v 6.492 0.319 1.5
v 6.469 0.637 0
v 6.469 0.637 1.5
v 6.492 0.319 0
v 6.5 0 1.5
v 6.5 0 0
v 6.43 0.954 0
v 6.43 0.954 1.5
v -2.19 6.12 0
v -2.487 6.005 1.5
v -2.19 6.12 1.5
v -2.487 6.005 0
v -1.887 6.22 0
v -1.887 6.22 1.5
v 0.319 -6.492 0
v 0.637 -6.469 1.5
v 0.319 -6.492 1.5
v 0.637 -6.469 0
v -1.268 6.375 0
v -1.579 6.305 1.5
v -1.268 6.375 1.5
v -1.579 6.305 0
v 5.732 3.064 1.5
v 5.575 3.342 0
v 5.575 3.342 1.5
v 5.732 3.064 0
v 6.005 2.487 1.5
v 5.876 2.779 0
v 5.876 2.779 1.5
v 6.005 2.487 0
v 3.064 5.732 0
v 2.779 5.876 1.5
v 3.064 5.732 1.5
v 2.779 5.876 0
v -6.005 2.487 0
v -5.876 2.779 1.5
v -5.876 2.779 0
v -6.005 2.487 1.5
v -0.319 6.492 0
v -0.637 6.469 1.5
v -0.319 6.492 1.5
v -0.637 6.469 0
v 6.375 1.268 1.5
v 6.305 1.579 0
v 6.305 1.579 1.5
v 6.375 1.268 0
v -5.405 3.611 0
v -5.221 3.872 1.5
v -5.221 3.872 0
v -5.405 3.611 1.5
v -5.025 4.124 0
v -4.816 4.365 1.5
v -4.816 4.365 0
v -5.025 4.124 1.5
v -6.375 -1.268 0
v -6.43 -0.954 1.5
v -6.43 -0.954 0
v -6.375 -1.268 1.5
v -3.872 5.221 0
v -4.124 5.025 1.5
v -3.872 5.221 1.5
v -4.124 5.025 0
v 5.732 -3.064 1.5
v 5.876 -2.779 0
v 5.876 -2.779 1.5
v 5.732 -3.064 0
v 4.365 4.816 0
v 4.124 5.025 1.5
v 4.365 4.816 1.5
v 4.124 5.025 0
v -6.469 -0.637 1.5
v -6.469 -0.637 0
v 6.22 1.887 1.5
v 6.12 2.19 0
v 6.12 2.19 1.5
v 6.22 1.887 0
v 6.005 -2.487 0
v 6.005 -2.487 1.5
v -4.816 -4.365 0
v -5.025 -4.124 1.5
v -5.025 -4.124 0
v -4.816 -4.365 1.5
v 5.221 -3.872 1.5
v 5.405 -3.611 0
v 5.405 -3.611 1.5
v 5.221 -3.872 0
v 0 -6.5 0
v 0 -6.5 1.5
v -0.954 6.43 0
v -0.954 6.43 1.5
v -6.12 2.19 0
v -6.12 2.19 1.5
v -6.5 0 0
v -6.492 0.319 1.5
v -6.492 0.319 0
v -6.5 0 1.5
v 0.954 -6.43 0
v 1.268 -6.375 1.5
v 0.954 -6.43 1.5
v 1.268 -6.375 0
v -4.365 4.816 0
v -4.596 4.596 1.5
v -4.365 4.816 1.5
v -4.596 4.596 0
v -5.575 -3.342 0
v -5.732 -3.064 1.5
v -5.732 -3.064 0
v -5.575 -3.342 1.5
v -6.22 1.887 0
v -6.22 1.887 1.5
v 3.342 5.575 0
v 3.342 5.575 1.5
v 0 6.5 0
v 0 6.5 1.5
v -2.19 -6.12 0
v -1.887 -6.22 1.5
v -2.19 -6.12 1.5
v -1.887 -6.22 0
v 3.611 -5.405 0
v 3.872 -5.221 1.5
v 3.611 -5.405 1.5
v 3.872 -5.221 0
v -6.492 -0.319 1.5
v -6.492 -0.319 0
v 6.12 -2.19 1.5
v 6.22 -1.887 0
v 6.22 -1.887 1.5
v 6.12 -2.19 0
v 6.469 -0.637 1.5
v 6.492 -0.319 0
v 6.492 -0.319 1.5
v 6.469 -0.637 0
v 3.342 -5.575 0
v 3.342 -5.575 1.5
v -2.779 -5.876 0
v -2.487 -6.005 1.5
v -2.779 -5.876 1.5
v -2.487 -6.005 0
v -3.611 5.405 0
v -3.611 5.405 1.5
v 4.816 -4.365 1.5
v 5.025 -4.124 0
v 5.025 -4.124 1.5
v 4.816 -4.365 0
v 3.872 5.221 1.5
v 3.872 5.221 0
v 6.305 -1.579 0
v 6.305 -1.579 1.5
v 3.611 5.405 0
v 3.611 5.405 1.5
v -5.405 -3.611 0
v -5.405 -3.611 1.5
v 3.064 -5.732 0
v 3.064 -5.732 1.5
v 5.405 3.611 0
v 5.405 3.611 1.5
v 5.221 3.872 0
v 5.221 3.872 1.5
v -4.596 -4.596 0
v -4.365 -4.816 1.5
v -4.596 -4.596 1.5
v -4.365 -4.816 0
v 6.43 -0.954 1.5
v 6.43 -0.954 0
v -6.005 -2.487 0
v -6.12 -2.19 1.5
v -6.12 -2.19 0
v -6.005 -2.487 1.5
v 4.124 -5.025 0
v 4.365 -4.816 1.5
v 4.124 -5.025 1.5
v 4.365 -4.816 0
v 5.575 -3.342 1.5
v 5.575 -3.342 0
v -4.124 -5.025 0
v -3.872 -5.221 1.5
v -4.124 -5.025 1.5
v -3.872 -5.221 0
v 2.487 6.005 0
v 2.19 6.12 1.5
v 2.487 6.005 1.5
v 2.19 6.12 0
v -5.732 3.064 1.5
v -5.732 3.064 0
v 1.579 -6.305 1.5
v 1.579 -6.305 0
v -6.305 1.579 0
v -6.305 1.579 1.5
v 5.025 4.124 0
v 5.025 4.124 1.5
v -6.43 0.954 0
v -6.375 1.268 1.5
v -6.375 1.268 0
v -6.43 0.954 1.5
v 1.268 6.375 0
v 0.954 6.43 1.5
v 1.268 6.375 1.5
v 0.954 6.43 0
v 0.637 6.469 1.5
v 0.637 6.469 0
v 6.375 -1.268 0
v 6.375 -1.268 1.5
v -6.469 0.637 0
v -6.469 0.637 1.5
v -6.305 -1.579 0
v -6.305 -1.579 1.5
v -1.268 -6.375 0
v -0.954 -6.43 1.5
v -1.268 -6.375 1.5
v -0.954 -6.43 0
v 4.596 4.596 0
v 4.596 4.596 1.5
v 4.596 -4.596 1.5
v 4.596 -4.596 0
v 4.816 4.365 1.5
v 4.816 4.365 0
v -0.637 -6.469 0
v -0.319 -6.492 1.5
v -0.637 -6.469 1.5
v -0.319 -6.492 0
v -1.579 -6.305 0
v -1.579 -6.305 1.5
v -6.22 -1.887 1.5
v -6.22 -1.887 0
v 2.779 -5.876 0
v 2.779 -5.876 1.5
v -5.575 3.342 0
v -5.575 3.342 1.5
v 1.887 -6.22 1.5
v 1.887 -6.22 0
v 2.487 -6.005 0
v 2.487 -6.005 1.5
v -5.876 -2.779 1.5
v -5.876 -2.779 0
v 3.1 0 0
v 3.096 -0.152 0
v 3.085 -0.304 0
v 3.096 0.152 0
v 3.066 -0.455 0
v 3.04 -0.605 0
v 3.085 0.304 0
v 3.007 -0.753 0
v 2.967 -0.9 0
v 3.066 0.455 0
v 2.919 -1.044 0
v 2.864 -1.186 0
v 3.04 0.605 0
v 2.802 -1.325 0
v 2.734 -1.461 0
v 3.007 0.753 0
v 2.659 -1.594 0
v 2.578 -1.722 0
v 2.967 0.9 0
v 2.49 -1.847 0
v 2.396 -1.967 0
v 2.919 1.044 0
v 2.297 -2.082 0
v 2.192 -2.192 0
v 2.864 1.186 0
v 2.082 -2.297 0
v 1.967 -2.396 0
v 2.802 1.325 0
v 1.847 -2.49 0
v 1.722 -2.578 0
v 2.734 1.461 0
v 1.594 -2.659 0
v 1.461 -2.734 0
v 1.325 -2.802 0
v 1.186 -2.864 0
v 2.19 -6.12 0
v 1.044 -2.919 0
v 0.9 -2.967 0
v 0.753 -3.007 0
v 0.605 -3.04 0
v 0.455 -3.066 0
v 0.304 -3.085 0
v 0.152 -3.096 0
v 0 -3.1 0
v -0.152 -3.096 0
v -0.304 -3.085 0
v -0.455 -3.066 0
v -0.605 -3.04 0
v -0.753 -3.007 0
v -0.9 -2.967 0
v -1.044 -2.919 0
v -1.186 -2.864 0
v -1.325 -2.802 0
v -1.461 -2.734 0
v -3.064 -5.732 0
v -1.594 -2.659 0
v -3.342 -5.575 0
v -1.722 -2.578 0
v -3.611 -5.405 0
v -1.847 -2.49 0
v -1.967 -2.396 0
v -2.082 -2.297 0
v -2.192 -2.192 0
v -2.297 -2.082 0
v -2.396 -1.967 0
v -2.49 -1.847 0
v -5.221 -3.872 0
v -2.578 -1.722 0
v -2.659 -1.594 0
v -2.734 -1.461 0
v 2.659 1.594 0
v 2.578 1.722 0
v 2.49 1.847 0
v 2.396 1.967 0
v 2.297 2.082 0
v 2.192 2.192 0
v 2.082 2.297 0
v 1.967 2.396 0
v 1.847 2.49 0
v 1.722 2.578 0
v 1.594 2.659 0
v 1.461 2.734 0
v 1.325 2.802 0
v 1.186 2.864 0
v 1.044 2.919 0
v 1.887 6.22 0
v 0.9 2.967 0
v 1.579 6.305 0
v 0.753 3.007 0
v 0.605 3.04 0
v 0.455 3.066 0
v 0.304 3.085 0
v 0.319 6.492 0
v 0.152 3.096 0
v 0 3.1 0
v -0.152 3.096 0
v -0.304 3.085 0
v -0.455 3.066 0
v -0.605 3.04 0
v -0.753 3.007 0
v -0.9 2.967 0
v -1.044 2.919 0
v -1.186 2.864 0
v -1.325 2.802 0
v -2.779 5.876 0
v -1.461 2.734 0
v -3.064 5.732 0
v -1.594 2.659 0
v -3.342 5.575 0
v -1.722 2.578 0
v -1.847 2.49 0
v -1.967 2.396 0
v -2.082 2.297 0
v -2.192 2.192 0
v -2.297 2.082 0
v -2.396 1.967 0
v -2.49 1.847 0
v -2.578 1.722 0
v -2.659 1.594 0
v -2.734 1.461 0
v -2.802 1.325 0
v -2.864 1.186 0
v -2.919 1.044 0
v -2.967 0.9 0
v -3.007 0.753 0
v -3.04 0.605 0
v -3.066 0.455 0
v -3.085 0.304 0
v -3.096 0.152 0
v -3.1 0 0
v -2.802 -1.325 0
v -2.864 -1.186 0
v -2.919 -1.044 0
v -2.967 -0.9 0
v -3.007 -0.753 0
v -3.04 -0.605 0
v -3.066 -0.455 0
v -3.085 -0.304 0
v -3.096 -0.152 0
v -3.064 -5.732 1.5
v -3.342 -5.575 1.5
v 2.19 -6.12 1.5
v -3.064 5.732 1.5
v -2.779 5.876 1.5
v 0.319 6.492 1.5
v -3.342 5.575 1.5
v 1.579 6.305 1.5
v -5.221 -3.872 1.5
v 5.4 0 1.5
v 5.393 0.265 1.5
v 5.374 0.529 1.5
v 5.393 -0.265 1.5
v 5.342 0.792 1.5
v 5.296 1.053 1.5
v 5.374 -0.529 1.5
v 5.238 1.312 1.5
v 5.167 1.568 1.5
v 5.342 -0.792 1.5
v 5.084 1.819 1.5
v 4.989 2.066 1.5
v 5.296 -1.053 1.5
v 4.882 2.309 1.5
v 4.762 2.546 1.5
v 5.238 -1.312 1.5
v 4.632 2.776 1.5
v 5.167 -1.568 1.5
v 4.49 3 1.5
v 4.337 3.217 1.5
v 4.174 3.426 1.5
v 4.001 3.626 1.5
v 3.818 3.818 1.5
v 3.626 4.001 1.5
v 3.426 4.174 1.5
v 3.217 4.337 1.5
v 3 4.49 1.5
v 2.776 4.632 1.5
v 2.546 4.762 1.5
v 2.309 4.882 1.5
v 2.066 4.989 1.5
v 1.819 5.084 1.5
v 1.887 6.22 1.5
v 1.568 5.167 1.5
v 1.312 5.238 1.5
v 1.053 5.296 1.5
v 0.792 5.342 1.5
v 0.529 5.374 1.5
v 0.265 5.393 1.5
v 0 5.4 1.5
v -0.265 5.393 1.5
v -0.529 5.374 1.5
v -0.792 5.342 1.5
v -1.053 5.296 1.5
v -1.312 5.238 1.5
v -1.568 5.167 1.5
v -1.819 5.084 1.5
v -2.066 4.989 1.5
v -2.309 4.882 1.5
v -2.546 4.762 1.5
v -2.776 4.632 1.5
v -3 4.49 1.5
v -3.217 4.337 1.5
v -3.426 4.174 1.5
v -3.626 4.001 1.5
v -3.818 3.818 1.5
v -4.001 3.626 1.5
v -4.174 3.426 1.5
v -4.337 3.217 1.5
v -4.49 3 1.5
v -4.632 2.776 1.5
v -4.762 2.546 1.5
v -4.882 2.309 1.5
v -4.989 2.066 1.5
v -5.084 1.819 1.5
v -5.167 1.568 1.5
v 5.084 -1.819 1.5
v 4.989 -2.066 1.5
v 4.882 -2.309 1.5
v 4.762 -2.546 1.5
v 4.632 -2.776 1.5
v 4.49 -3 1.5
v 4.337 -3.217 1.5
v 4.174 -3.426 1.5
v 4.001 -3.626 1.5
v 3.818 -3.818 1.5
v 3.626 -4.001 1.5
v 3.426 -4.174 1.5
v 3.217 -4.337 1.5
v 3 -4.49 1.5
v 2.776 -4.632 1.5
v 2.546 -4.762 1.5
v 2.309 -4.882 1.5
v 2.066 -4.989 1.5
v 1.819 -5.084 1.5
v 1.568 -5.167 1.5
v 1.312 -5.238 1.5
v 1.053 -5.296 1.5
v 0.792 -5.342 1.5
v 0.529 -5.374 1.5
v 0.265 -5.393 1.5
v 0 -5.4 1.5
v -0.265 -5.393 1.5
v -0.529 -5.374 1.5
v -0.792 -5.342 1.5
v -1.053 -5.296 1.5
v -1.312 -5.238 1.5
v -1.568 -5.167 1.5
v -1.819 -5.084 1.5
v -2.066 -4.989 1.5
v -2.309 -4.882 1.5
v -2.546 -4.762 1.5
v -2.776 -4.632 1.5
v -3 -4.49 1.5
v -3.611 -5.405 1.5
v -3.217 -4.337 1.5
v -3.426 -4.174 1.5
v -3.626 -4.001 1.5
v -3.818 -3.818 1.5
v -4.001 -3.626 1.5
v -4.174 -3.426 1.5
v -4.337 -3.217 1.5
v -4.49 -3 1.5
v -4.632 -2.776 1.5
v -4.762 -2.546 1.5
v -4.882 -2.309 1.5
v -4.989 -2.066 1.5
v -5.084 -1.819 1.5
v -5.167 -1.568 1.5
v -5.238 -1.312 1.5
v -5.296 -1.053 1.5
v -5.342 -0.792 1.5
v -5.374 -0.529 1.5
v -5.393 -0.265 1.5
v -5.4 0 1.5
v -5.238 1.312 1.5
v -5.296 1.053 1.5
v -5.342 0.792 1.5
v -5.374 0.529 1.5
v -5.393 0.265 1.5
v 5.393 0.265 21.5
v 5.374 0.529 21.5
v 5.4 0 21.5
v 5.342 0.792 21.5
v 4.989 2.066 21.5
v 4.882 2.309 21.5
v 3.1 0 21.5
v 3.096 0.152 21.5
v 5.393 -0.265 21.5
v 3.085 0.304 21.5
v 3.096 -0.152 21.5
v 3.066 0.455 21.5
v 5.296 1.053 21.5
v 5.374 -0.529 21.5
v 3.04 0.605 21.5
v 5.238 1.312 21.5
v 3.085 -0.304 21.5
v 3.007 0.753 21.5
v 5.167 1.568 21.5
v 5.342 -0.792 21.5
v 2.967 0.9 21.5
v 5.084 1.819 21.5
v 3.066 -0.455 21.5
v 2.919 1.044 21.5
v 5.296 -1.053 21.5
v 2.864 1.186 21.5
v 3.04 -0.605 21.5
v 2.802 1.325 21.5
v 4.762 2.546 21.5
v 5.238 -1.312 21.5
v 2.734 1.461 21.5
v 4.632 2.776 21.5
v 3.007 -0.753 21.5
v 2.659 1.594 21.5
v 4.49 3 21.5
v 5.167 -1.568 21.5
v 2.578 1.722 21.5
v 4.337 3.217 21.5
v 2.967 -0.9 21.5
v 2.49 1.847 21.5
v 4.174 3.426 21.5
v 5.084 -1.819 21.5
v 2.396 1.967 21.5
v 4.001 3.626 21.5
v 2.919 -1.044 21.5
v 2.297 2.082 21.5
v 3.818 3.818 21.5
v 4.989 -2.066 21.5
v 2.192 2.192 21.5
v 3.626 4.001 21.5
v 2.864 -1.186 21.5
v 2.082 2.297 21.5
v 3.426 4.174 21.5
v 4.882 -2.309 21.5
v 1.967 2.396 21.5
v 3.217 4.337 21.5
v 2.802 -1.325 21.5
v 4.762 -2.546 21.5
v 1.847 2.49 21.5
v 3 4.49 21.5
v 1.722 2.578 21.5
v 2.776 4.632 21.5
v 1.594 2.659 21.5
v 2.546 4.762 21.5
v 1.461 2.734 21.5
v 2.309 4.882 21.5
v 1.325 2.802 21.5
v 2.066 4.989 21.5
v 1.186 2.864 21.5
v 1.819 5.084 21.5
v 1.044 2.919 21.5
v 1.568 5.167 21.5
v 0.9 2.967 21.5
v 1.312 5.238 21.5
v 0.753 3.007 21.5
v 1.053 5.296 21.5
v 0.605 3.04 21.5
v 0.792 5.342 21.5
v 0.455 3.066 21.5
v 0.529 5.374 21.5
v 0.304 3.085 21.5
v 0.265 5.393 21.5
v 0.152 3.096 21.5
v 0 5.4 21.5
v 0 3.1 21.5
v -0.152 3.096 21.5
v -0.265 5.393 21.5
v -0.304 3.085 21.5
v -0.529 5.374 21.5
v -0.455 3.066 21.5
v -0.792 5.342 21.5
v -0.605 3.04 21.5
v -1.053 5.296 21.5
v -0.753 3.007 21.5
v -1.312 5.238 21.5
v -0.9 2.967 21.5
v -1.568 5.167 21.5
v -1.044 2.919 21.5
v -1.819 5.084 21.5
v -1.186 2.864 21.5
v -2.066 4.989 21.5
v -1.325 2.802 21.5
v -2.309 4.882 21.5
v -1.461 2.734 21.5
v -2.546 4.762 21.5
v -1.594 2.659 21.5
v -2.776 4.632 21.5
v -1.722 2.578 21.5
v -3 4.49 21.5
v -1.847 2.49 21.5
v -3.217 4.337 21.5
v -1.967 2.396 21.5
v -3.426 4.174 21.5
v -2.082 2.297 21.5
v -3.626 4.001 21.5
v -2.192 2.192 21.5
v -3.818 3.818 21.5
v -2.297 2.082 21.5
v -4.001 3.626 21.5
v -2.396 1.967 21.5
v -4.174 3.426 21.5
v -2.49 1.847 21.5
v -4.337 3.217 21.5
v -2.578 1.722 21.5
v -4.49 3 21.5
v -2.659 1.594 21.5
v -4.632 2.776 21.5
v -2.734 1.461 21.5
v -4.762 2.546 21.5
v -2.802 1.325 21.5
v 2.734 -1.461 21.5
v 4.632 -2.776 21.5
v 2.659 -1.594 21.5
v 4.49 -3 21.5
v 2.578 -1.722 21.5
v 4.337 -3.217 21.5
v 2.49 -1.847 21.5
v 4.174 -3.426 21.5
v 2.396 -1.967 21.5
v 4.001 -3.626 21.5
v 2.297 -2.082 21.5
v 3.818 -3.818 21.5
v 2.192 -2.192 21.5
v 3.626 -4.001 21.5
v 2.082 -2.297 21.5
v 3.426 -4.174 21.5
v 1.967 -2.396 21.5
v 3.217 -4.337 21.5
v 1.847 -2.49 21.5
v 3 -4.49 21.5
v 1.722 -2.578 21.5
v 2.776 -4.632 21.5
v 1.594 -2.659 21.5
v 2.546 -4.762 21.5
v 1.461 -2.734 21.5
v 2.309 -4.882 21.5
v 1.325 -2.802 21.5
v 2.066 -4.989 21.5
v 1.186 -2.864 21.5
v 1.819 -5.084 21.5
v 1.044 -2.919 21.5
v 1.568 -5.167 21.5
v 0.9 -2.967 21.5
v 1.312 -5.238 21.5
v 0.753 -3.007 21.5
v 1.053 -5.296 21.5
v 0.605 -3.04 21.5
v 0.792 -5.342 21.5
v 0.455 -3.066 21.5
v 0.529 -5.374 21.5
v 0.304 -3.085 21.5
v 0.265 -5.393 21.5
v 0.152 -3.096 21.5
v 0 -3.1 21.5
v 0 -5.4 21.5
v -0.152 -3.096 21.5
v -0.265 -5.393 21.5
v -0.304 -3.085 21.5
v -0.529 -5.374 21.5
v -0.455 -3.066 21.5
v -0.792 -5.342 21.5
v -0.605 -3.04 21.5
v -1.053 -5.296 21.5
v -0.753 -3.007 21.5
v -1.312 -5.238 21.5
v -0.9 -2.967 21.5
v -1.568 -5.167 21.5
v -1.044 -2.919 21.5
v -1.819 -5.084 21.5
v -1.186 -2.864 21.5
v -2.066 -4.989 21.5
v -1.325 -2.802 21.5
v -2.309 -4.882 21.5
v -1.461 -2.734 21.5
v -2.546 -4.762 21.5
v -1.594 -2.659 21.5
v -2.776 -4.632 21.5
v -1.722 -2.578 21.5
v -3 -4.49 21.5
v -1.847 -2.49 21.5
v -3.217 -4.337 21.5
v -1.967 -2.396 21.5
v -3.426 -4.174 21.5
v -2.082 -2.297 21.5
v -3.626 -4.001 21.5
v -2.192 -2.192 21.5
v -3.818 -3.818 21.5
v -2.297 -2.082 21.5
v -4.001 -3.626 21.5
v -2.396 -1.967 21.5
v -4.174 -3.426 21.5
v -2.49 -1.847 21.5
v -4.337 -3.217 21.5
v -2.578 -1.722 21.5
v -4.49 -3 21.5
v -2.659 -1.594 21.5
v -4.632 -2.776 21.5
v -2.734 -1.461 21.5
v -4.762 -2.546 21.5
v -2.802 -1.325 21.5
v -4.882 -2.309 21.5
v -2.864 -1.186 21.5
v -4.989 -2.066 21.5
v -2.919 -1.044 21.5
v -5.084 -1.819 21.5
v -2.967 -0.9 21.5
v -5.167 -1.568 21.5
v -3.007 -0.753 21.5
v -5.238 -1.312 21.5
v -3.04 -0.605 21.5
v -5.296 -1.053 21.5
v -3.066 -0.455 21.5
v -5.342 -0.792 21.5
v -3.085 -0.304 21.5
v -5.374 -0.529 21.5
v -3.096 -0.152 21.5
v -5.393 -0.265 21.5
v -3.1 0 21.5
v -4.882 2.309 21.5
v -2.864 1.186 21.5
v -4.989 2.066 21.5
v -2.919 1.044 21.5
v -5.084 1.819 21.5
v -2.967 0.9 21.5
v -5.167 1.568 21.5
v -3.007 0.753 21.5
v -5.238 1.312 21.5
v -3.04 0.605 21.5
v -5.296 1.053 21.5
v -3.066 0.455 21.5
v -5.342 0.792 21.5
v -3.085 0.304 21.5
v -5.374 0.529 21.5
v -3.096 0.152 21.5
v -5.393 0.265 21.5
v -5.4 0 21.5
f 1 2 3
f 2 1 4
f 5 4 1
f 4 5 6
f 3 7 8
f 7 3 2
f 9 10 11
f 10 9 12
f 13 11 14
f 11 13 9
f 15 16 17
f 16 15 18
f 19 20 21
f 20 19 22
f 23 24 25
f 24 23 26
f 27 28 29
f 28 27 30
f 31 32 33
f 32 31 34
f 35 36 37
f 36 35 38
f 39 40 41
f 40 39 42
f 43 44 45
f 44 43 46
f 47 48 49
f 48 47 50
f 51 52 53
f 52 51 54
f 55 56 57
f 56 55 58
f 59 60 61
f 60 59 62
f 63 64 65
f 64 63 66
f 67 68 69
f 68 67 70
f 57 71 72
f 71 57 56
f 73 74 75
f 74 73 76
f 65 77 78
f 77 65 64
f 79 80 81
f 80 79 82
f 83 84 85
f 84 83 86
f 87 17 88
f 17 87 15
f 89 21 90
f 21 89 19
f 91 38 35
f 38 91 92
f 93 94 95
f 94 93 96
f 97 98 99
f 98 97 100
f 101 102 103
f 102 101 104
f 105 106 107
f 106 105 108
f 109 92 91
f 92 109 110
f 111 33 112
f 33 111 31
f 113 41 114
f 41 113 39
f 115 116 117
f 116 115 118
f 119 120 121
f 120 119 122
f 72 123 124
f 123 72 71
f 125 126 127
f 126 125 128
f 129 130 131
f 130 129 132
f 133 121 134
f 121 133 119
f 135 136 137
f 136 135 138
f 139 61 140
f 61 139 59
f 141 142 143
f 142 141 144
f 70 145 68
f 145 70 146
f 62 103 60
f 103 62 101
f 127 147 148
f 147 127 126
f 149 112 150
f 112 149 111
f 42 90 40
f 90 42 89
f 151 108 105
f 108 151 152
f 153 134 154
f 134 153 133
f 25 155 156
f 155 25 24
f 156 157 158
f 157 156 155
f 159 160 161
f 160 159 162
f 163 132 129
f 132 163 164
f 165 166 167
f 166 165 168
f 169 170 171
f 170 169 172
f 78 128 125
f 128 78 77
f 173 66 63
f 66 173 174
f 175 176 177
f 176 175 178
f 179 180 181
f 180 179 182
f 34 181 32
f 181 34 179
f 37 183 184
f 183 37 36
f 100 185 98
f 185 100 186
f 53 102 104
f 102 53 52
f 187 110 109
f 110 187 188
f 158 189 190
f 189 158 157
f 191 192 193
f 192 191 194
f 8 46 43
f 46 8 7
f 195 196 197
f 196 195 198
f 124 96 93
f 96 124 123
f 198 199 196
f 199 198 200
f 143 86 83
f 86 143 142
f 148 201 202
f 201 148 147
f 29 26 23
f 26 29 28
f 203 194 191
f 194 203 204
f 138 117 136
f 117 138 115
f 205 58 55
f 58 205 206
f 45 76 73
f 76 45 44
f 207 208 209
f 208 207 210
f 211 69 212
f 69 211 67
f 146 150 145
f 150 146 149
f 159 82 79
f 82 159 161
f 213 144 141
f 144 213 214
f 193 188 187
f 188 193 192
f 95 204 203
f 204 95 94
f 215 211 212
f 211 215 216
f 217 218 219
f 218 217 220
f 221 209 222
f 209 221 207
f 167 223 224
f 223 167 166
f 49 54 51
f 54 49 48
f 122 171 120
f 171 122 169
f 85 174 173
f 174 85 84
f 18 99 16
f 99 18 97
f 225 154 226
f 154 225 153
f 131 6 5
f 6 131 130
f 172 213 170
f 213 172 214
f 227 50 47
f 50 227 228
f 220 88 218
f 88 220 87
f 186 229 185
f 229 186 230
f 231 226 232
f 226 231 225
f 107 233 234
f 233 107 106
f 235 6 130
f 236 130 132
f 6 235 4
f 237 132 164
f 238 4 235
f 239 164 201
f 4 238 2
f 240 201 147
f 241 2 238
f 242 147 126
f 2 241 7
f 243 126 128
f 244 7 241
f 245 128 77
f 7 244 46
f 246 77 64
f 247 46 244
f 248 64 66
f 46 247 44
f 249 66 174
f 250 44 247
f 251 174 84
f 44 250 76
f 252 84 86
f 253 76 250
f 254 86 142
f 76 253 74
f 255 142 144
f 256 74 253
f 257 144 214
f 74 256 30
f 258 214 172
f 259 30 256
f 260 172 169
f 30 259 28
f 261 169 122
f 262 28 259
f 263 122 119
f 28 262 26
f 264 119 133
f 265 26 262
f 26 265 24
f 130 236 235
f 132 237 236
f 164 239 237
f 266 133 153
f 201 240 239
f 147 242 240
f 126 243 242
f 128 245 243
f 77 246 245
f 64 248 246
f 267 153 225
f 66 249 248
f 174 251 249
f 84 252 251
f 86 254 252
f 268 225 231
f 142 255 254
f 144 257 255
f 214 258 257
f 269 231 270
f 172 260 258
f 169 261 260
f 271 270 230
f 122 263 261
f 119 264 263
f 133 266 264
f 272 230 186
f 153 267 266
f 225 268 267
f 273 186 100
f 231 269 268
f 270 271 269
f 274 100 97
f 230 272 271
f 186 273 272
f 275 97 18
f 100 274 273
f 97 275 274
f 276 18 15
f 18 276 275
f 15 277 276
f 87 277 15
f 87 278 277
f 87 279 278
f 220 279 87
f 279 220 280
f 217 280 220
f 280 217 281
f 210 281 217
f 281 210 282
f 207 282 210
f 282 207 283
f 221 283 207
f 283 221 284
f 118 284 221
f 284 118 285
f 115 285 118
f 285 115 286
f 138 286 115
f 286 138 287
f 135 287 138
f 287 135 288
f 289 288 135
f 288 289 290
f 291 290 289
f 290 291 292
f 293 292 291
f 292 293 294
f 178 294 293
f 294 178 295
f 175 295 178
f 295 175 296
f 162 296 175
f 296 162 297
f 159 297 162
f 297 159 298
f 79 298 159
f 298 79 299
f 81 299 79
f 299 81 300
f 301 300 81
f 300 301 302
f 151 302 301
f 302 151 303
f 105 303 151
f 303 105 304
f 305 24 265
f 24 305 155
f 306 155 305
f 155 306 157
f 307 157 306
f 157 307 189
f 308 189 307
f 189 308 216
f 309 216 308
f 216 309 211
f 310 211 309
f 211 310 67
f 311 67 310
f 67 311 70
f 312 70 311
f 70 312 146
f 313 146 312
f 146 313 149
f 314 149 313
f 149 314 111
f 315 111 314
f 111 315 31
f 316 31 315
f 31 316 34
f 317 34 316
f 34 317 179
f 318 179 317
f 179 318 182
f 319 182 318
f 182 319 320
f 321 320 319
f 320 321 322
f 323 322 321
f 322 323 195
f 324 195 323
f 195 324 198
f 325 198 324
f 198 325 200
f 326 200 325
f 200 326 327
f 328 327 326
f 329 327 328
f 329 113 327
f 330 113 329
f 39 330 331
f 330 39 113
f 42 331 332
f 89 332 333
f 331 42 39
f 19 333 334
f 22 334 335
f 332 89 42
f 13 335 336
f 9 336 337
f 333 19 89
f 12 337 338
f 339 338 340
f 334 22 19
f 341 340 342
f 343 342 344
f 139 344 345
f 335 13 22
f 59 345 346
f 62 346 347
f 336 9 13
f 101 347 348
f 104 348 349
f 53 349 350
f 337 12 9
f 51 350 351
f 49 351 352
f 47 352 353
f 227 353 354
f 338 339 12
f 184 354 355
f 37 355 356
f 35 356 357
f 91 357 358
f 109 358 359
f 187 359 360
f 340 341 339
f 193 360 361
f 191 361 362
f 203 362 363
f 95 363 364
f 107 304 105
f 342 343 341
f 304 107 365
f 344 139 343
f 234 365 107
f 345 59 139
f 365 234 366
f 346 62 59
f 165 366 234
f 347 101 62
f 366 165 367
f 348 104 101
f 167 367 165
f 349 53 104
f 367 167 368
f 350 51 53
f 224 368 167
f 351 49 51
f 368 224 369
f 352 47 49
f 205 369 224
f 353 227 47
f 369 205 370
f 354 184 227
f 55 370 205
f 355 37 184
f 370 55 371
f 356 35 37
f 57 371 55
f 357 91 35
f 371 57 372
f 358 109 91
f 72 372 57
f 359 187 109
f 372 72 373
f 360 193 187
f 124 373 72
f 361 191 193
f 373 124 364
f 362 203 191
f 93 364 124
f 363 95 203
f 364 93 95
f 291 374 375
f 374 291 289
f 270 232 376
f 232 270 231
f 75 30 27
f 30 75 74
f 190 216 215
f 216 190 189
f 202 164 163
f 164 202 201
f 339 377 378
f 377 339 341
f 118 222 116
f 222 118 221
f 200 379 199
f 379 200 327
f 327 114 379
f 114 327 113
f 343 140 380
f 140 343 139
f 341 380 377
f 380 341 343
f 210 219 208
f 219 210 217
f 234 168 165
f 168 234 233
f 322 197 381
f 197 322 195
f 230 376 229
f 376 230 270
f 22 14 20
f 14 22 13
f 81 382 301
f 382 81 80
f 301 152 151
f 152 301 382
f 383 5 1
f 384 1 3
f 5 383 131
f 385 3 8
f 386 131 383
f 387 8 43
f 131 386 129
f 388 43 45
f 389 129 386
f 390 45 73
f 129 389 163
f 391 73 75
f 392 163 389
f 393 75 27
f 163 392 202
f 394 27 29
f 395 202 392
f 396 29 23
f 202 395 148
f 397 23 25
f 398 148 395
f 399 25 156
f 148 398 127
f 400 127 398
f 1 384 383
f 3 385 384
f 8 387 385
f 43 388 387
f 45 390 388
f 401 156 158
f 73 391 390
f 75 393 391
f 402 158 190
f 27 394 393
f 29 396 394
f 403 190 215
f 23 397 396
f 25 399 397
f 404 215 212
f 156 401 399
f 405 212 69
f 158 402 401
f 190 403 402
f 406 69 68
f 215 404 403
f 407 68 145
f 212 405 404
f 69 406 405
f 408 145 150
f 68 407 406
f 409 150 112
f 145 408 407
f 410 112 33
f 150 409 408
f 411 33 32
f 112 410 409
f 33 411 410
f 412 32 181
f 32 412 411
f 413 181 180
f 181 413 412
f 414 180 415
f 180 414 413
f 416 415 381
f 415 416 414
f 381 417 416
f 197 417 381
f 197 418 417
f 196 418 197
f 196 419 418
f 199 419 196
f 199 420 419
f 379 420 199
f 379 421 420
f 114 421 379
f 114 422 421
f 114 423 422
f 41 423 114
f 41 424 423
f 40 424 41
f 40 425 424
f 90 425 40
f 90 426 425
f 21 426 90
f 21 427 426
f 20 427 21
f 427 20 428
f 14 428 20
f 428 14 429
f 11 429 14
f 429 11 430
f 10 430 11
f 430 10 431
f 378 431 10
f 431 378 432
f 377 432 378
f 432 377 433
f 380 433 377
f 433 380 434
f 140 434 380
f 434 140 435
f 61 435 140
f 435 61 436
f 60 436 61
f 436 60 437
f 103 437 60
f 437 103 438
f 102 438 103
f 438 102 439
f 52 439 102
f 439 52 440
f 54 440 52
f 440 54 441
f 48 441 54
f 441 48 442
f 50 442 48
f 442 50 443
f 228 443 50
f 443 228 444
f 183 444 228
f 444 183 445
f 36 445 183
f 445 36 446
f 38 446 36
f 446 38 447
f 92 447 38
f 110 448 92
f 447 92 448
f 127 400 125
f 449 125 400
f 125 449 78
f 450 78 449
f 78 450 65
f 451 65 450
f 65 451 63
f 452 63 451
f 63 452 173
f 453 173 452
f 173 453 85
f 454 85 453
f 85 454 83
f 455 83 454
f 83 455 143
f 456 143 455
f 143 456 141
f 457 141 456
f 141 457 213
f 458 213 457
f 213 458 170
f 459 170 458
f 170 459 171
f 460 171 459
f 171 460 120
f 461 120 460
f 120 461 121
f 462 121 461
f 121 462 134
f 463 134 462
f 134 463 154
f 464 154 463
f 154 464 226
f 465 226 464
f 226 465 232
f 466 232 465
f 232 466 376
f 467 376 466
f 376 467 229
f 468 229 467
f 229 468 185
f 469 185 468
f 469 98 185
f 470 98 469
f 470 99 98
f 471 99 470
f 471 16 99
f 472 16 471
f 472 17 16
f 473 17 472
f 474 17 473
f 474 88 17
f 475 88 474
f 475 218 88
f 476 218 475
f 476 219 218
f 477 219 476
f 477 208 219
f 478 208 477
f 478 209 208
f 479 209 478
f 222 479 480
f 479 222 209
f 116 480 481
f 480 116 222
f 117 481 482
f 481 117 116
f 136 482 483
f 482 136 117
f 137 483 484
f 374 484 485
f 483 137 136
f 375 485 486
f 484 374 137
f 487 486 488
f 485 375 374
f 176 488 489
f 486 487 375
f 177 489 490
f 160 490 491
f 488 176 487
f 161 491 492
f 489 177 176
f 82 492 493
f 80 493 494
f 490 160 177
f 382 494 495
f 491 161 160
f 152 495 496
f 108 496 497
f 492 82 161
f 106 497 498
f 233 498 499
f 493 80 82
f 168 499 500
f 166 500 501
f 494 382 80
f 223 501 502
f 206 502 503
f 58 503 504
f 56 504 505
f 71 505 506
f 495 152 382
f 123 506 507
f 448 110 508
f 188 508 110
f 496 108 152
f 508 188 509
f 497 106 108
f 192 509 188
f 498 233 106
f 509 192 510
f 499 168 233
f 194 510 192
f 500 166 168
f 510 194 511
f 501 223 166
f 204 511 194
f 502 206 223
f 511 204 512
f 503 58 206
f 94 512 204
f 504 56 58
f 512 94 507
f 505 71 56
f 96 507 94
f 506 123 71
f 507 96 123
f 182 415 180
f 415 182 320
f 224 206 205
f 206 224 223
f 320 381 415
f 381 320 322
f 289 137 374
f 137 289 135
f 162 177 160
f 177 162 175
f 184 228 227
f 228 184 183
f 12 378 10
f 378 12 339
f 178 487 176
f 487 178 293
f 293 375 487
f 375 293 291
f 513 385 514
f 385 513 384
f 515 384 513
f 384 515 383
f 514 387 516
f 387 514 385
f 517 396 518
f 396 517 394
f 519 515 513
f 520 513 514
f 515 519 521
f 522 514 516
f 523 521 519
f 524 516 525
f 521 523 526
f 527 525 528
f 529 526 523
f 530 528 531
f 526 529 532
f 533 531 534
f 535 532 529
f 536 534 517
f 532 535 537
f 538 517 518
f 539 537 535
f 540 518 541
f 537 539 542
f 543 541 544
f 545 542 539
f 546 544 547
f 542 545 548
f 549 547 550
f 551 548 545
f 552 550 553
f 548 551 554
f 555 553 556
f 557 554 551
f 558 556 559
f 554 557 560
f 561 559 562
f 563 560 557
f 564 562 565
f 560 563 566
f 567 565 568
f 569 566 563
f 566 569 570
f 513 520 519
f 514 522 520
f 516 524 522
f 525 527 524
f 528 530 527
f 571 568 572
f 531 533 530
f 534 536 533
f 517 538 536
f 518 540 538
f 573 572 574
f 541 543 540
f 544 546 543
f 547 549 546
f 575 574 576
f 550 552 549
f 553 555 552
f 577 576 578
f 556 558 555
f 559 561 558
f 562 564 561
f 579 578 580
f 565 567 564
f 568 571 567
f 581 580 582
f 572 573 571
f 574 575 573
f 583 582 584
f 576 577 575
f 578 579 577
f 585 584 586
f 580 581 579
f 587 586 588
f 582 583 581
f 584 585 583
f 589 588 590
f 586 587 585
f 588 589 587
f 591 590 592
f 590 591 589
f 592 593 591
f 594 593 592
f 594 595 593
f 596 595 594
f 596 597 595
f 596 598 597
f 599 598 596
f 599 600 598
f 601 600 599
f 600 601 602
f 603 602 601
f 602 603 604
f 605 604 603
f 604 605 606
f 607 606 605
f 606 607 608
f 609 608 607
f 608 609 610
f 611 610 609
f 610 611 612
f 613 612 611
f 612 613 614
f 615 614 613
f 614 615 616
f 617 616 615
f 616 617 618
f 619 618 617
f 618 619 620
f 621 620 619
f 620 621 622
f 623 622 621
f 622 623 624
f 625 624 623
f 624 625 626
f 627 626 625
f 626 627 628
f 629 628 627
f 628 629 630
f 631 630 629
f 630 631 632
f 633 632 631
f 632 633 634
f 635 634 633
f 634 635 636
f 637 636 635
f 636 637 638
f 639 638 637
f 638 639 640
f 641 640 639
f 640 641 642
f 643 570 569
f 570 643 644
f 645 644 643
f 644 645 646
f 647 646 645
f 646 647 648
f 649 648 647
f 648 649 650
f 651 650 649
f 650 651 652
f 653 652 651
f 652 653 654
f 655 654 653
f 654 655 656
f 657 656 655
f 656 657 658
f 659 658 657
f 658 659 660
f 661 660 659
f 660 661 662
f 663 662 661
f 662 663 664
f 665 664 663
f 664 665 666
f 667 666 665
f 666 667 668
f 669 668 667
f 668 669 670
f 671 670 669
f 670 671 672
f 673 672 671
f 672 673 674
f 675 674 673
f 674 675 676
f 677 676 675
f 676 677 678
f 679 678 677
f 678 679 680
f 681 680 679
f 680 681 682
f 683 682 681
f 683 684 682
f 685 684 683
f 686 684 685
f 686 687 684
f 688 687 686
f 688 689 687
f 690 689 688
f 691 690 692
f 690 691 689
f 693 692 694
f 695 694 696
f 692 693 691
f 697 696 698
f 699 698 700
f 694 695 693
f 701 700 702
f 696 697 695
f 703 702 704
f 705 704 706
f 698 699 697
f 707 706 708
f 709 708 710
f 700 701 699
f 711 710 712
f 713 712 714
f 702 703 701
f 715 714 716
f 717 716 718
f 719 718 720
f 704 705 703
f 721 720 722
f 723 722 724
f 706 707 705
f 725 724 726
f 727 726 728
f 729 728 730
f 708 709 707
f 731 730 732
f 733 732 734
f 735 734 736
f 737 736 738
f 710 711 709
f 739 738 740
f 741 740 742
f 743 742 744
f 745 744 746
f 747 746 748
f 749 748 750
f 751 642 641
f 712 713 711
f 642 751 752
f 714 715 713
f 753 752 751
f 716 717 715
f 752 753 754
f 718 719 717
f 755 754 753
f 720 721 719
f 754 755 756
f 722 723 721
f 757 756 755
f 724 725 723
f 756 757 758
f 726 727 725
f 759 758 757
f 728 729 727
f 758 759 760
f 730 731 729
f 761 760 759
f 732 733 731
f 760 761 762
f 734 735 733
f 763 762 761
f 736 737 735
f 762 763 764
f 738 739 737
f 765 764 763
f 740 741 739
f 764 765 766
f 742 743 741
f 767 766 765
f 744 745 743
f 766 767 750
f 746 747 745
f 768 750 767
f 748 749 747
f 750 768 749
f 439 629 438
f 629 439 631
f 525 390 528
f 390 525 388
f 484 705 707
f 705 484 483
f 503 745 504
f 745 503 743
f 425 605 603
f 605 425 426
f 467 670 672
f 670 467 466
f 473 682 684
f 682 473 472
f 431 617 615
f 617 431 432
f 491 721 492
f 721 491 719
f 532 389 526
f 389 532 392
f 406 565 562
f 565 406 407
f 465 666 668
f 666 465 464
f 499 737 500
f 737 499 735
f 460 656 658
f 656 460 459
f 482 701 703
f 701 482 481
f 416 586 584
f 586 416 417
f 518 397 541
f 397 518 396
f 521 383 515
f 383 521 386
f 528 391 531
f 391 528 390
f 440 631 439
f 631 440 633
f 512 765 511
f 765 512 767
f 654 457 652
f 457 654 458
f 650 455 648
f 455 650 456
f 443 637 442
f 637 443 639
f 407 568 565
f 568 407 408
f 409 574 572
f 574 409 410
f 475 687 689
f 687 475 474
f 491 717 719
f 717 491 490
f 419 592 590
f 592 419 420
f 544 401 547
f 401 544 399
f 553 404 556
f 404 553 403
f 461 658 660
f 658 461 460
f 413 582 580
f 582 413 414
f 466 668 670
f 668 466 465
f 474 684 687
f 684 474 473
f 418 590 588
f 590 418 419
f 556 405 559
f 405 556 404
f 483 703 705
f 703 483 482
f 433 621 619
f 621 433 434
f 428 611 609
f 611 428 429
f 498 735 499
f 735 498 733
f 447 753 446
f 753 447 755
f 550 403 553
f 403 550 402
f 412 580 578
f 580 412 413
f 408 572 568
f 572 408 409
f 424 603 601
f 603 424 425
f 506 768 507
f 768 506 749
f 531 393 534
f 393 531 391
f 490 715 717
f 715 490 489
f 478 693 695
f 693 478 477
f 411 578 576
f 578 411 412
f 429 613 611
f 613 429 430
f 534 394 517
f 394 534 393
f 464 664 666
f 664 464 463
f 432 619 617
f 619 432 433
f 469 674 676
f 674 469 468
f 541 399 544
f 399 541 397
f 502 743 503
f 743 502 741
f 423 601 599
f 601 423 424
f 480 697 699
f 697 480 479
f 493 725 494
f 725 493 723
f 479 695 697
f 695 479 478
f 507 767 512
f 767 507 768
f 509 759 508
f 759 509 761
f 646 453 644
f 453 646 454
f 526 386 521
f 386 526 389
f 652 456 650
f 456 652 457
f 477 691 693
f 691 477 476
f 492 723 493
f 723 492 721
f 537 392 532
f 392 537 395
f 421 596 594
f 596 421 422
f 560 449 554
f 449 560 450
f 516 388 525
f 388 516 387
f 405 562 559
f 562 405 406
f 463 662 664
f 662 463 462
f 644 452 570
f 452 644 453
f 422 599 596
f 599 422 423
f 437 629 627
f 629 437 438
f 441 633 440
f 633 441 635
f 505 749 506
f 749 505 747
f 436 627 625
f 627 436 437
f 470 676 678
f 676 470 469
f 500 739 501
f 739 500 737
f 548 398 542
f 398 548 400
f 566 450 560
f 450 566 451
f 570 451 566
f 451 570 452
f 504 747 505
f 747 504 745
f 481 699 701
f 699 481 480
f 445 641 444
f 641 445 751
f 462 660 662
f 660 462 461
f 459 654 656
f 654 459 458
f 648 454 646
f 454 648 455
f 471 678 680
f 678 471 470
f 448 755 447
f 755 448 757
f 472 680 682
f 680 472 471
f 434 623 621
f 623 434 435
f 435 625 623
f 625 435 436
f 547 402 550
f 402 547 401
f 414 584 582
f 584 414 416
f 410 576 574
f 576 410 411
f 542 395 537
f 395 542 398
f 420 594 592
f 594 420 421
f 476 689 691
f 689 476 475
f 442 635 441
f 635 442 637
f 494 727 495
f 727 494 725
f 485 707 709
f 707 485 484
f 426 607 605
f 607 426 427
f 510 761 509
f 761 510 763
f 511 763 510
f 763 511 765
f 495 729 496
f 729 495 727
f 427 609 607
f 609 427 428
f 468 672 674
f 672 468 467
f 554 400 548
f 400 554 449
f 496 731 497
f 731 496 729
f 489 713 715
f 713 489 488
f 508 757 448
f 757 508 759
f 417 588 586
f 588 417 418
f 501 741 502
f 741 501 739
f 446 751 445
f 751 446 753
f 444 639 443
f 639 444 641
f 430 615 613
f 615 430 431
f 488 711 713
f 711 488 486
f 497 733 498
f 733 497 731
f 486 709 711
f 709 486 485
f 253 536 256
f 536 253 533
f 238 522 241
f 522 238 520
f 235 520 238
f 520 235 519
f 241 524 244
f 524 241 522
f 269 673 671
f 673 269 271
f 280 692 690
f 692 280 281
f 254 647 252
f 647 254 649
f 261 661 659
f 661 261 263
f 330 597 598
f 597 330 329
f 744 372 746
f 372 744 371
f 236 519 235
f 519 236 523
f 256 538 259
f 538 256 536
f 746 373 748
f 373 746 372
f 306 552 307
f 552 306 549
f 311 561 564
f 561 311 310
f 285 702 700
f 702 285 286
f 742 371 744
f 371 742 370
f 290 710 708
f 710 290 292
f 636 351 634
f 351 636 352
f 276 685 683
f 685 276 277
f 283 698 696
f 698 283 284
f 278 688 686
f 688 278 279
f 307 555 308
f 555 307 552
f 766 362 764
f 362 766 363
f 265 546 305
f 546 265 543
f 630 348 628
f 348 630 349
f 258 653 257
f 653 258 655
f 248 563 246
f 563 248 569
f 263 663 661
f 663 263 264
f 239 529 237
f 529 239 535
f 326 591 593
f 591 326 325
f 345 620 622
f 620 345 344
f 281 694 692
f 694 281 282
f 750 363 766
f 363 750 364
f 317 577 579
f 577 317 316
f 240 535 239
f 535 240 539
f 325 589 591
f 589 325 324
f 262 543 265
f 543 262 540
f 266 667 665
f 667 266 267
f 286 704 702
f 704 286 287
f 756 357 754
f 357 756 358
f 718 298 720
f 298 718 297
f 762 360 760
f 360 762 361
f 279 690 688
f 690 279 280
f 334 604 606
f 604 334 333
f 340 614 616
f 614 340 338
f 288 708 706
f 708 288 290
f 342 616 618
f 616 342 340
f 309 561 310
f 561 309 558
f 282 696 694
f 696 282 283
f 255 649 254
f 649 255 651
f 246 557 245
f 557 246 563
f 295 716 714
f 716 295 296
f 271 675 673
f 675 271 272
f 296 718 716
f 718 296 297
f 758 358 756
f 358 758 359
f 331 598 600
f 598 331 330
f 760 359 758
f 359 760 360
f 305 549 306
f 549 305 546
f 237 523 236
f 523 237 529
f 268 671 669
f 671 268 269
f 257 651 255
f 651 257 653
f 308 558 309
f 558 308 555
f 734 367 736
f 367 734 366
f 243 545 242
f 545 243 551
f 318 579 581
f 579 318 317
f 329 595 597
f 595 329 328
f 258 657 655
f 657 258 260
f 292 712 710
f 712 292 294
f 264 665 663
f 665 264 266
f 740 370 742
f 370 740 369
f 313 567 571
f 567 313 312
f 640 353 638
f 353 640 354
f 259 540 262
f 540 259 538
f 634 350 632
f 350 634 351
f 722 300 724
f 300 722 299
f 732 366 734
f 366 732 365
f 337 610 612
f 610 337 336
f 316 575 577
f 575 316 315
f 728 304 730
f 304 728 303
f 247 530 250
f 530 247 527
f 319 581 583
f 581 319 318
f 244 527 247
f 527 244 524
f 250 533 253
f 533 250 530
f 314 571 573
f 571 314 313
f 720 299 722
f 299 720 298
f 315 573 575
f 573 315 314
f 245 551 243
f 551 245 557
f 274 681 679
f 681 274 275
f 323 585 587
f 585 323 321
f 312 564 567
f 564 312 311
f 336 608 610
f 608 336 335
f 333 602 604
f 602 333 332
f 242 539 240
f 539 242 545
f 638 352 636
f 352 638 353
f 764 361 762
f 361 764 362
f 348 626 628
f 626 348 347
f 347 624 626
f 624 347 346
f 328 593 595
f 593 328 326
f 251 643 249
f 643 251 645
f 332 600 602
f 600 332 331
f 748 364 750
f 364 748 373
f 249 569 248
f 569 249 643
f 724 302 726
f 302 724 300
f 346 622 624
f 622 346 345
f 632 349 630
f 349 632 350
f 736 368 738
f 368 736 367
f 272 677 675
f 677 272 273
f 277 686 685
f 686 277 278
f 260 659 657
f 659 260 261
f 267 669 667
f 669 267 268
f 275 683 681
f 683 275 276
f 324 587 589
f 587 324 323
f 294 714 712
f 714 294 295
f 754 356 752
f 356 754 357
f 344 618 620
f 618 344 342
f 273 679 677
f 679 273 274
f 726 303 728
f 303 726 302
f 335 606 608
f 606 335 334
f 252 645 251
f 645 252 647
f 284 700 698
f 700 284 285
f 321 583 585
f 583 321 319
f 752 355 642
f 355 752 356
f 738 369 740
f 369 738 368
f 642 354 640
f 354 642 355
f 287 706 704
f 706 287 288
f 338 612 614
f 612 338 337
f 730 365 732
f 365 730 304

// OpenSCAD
// Parameters (all in mm)
collar_d   = 13;    // collar outer diameter
collar_h   = 1.5;   // collar thickness (height)
sleeve_d   = 10.8;  // sleeve outer diameter
sleeve_h   = 20.0;  // sleeve body height (21.5‑1.5)
bore_d     = 6.2;   // straight bore diameter
clearance  = 0.02;  // extra length for cutting shapes (to avoid coplanar faces)

$fn = 128; // smooth curved surfaces

// Full part before boring
module part() {
    union() {
        // Collar (lies on the bed)
        cylinder(d = collar_d, h = collar_h);
        // Sleeve body (starts on top of collar)
        translate([0, 0, collar_h])
            cylinder(d = sleeve_d, h = sleeve_h);
    }
}

// Bore that cuts through the entire height
module bore() {
    // Height of bore = total part height + 2*clearance
    cylinder(d = bore_d, h = collar_h + sleeve_h + 2*clearance);
    // Shift so it extends beyond both ends
    translate([0, 0, -clearance])
        cylinder(d = bore_d, h = collar_h + sleeve_h + 2*clearance);
}

// Final solid
difference() {
    part();
    bore();
}
